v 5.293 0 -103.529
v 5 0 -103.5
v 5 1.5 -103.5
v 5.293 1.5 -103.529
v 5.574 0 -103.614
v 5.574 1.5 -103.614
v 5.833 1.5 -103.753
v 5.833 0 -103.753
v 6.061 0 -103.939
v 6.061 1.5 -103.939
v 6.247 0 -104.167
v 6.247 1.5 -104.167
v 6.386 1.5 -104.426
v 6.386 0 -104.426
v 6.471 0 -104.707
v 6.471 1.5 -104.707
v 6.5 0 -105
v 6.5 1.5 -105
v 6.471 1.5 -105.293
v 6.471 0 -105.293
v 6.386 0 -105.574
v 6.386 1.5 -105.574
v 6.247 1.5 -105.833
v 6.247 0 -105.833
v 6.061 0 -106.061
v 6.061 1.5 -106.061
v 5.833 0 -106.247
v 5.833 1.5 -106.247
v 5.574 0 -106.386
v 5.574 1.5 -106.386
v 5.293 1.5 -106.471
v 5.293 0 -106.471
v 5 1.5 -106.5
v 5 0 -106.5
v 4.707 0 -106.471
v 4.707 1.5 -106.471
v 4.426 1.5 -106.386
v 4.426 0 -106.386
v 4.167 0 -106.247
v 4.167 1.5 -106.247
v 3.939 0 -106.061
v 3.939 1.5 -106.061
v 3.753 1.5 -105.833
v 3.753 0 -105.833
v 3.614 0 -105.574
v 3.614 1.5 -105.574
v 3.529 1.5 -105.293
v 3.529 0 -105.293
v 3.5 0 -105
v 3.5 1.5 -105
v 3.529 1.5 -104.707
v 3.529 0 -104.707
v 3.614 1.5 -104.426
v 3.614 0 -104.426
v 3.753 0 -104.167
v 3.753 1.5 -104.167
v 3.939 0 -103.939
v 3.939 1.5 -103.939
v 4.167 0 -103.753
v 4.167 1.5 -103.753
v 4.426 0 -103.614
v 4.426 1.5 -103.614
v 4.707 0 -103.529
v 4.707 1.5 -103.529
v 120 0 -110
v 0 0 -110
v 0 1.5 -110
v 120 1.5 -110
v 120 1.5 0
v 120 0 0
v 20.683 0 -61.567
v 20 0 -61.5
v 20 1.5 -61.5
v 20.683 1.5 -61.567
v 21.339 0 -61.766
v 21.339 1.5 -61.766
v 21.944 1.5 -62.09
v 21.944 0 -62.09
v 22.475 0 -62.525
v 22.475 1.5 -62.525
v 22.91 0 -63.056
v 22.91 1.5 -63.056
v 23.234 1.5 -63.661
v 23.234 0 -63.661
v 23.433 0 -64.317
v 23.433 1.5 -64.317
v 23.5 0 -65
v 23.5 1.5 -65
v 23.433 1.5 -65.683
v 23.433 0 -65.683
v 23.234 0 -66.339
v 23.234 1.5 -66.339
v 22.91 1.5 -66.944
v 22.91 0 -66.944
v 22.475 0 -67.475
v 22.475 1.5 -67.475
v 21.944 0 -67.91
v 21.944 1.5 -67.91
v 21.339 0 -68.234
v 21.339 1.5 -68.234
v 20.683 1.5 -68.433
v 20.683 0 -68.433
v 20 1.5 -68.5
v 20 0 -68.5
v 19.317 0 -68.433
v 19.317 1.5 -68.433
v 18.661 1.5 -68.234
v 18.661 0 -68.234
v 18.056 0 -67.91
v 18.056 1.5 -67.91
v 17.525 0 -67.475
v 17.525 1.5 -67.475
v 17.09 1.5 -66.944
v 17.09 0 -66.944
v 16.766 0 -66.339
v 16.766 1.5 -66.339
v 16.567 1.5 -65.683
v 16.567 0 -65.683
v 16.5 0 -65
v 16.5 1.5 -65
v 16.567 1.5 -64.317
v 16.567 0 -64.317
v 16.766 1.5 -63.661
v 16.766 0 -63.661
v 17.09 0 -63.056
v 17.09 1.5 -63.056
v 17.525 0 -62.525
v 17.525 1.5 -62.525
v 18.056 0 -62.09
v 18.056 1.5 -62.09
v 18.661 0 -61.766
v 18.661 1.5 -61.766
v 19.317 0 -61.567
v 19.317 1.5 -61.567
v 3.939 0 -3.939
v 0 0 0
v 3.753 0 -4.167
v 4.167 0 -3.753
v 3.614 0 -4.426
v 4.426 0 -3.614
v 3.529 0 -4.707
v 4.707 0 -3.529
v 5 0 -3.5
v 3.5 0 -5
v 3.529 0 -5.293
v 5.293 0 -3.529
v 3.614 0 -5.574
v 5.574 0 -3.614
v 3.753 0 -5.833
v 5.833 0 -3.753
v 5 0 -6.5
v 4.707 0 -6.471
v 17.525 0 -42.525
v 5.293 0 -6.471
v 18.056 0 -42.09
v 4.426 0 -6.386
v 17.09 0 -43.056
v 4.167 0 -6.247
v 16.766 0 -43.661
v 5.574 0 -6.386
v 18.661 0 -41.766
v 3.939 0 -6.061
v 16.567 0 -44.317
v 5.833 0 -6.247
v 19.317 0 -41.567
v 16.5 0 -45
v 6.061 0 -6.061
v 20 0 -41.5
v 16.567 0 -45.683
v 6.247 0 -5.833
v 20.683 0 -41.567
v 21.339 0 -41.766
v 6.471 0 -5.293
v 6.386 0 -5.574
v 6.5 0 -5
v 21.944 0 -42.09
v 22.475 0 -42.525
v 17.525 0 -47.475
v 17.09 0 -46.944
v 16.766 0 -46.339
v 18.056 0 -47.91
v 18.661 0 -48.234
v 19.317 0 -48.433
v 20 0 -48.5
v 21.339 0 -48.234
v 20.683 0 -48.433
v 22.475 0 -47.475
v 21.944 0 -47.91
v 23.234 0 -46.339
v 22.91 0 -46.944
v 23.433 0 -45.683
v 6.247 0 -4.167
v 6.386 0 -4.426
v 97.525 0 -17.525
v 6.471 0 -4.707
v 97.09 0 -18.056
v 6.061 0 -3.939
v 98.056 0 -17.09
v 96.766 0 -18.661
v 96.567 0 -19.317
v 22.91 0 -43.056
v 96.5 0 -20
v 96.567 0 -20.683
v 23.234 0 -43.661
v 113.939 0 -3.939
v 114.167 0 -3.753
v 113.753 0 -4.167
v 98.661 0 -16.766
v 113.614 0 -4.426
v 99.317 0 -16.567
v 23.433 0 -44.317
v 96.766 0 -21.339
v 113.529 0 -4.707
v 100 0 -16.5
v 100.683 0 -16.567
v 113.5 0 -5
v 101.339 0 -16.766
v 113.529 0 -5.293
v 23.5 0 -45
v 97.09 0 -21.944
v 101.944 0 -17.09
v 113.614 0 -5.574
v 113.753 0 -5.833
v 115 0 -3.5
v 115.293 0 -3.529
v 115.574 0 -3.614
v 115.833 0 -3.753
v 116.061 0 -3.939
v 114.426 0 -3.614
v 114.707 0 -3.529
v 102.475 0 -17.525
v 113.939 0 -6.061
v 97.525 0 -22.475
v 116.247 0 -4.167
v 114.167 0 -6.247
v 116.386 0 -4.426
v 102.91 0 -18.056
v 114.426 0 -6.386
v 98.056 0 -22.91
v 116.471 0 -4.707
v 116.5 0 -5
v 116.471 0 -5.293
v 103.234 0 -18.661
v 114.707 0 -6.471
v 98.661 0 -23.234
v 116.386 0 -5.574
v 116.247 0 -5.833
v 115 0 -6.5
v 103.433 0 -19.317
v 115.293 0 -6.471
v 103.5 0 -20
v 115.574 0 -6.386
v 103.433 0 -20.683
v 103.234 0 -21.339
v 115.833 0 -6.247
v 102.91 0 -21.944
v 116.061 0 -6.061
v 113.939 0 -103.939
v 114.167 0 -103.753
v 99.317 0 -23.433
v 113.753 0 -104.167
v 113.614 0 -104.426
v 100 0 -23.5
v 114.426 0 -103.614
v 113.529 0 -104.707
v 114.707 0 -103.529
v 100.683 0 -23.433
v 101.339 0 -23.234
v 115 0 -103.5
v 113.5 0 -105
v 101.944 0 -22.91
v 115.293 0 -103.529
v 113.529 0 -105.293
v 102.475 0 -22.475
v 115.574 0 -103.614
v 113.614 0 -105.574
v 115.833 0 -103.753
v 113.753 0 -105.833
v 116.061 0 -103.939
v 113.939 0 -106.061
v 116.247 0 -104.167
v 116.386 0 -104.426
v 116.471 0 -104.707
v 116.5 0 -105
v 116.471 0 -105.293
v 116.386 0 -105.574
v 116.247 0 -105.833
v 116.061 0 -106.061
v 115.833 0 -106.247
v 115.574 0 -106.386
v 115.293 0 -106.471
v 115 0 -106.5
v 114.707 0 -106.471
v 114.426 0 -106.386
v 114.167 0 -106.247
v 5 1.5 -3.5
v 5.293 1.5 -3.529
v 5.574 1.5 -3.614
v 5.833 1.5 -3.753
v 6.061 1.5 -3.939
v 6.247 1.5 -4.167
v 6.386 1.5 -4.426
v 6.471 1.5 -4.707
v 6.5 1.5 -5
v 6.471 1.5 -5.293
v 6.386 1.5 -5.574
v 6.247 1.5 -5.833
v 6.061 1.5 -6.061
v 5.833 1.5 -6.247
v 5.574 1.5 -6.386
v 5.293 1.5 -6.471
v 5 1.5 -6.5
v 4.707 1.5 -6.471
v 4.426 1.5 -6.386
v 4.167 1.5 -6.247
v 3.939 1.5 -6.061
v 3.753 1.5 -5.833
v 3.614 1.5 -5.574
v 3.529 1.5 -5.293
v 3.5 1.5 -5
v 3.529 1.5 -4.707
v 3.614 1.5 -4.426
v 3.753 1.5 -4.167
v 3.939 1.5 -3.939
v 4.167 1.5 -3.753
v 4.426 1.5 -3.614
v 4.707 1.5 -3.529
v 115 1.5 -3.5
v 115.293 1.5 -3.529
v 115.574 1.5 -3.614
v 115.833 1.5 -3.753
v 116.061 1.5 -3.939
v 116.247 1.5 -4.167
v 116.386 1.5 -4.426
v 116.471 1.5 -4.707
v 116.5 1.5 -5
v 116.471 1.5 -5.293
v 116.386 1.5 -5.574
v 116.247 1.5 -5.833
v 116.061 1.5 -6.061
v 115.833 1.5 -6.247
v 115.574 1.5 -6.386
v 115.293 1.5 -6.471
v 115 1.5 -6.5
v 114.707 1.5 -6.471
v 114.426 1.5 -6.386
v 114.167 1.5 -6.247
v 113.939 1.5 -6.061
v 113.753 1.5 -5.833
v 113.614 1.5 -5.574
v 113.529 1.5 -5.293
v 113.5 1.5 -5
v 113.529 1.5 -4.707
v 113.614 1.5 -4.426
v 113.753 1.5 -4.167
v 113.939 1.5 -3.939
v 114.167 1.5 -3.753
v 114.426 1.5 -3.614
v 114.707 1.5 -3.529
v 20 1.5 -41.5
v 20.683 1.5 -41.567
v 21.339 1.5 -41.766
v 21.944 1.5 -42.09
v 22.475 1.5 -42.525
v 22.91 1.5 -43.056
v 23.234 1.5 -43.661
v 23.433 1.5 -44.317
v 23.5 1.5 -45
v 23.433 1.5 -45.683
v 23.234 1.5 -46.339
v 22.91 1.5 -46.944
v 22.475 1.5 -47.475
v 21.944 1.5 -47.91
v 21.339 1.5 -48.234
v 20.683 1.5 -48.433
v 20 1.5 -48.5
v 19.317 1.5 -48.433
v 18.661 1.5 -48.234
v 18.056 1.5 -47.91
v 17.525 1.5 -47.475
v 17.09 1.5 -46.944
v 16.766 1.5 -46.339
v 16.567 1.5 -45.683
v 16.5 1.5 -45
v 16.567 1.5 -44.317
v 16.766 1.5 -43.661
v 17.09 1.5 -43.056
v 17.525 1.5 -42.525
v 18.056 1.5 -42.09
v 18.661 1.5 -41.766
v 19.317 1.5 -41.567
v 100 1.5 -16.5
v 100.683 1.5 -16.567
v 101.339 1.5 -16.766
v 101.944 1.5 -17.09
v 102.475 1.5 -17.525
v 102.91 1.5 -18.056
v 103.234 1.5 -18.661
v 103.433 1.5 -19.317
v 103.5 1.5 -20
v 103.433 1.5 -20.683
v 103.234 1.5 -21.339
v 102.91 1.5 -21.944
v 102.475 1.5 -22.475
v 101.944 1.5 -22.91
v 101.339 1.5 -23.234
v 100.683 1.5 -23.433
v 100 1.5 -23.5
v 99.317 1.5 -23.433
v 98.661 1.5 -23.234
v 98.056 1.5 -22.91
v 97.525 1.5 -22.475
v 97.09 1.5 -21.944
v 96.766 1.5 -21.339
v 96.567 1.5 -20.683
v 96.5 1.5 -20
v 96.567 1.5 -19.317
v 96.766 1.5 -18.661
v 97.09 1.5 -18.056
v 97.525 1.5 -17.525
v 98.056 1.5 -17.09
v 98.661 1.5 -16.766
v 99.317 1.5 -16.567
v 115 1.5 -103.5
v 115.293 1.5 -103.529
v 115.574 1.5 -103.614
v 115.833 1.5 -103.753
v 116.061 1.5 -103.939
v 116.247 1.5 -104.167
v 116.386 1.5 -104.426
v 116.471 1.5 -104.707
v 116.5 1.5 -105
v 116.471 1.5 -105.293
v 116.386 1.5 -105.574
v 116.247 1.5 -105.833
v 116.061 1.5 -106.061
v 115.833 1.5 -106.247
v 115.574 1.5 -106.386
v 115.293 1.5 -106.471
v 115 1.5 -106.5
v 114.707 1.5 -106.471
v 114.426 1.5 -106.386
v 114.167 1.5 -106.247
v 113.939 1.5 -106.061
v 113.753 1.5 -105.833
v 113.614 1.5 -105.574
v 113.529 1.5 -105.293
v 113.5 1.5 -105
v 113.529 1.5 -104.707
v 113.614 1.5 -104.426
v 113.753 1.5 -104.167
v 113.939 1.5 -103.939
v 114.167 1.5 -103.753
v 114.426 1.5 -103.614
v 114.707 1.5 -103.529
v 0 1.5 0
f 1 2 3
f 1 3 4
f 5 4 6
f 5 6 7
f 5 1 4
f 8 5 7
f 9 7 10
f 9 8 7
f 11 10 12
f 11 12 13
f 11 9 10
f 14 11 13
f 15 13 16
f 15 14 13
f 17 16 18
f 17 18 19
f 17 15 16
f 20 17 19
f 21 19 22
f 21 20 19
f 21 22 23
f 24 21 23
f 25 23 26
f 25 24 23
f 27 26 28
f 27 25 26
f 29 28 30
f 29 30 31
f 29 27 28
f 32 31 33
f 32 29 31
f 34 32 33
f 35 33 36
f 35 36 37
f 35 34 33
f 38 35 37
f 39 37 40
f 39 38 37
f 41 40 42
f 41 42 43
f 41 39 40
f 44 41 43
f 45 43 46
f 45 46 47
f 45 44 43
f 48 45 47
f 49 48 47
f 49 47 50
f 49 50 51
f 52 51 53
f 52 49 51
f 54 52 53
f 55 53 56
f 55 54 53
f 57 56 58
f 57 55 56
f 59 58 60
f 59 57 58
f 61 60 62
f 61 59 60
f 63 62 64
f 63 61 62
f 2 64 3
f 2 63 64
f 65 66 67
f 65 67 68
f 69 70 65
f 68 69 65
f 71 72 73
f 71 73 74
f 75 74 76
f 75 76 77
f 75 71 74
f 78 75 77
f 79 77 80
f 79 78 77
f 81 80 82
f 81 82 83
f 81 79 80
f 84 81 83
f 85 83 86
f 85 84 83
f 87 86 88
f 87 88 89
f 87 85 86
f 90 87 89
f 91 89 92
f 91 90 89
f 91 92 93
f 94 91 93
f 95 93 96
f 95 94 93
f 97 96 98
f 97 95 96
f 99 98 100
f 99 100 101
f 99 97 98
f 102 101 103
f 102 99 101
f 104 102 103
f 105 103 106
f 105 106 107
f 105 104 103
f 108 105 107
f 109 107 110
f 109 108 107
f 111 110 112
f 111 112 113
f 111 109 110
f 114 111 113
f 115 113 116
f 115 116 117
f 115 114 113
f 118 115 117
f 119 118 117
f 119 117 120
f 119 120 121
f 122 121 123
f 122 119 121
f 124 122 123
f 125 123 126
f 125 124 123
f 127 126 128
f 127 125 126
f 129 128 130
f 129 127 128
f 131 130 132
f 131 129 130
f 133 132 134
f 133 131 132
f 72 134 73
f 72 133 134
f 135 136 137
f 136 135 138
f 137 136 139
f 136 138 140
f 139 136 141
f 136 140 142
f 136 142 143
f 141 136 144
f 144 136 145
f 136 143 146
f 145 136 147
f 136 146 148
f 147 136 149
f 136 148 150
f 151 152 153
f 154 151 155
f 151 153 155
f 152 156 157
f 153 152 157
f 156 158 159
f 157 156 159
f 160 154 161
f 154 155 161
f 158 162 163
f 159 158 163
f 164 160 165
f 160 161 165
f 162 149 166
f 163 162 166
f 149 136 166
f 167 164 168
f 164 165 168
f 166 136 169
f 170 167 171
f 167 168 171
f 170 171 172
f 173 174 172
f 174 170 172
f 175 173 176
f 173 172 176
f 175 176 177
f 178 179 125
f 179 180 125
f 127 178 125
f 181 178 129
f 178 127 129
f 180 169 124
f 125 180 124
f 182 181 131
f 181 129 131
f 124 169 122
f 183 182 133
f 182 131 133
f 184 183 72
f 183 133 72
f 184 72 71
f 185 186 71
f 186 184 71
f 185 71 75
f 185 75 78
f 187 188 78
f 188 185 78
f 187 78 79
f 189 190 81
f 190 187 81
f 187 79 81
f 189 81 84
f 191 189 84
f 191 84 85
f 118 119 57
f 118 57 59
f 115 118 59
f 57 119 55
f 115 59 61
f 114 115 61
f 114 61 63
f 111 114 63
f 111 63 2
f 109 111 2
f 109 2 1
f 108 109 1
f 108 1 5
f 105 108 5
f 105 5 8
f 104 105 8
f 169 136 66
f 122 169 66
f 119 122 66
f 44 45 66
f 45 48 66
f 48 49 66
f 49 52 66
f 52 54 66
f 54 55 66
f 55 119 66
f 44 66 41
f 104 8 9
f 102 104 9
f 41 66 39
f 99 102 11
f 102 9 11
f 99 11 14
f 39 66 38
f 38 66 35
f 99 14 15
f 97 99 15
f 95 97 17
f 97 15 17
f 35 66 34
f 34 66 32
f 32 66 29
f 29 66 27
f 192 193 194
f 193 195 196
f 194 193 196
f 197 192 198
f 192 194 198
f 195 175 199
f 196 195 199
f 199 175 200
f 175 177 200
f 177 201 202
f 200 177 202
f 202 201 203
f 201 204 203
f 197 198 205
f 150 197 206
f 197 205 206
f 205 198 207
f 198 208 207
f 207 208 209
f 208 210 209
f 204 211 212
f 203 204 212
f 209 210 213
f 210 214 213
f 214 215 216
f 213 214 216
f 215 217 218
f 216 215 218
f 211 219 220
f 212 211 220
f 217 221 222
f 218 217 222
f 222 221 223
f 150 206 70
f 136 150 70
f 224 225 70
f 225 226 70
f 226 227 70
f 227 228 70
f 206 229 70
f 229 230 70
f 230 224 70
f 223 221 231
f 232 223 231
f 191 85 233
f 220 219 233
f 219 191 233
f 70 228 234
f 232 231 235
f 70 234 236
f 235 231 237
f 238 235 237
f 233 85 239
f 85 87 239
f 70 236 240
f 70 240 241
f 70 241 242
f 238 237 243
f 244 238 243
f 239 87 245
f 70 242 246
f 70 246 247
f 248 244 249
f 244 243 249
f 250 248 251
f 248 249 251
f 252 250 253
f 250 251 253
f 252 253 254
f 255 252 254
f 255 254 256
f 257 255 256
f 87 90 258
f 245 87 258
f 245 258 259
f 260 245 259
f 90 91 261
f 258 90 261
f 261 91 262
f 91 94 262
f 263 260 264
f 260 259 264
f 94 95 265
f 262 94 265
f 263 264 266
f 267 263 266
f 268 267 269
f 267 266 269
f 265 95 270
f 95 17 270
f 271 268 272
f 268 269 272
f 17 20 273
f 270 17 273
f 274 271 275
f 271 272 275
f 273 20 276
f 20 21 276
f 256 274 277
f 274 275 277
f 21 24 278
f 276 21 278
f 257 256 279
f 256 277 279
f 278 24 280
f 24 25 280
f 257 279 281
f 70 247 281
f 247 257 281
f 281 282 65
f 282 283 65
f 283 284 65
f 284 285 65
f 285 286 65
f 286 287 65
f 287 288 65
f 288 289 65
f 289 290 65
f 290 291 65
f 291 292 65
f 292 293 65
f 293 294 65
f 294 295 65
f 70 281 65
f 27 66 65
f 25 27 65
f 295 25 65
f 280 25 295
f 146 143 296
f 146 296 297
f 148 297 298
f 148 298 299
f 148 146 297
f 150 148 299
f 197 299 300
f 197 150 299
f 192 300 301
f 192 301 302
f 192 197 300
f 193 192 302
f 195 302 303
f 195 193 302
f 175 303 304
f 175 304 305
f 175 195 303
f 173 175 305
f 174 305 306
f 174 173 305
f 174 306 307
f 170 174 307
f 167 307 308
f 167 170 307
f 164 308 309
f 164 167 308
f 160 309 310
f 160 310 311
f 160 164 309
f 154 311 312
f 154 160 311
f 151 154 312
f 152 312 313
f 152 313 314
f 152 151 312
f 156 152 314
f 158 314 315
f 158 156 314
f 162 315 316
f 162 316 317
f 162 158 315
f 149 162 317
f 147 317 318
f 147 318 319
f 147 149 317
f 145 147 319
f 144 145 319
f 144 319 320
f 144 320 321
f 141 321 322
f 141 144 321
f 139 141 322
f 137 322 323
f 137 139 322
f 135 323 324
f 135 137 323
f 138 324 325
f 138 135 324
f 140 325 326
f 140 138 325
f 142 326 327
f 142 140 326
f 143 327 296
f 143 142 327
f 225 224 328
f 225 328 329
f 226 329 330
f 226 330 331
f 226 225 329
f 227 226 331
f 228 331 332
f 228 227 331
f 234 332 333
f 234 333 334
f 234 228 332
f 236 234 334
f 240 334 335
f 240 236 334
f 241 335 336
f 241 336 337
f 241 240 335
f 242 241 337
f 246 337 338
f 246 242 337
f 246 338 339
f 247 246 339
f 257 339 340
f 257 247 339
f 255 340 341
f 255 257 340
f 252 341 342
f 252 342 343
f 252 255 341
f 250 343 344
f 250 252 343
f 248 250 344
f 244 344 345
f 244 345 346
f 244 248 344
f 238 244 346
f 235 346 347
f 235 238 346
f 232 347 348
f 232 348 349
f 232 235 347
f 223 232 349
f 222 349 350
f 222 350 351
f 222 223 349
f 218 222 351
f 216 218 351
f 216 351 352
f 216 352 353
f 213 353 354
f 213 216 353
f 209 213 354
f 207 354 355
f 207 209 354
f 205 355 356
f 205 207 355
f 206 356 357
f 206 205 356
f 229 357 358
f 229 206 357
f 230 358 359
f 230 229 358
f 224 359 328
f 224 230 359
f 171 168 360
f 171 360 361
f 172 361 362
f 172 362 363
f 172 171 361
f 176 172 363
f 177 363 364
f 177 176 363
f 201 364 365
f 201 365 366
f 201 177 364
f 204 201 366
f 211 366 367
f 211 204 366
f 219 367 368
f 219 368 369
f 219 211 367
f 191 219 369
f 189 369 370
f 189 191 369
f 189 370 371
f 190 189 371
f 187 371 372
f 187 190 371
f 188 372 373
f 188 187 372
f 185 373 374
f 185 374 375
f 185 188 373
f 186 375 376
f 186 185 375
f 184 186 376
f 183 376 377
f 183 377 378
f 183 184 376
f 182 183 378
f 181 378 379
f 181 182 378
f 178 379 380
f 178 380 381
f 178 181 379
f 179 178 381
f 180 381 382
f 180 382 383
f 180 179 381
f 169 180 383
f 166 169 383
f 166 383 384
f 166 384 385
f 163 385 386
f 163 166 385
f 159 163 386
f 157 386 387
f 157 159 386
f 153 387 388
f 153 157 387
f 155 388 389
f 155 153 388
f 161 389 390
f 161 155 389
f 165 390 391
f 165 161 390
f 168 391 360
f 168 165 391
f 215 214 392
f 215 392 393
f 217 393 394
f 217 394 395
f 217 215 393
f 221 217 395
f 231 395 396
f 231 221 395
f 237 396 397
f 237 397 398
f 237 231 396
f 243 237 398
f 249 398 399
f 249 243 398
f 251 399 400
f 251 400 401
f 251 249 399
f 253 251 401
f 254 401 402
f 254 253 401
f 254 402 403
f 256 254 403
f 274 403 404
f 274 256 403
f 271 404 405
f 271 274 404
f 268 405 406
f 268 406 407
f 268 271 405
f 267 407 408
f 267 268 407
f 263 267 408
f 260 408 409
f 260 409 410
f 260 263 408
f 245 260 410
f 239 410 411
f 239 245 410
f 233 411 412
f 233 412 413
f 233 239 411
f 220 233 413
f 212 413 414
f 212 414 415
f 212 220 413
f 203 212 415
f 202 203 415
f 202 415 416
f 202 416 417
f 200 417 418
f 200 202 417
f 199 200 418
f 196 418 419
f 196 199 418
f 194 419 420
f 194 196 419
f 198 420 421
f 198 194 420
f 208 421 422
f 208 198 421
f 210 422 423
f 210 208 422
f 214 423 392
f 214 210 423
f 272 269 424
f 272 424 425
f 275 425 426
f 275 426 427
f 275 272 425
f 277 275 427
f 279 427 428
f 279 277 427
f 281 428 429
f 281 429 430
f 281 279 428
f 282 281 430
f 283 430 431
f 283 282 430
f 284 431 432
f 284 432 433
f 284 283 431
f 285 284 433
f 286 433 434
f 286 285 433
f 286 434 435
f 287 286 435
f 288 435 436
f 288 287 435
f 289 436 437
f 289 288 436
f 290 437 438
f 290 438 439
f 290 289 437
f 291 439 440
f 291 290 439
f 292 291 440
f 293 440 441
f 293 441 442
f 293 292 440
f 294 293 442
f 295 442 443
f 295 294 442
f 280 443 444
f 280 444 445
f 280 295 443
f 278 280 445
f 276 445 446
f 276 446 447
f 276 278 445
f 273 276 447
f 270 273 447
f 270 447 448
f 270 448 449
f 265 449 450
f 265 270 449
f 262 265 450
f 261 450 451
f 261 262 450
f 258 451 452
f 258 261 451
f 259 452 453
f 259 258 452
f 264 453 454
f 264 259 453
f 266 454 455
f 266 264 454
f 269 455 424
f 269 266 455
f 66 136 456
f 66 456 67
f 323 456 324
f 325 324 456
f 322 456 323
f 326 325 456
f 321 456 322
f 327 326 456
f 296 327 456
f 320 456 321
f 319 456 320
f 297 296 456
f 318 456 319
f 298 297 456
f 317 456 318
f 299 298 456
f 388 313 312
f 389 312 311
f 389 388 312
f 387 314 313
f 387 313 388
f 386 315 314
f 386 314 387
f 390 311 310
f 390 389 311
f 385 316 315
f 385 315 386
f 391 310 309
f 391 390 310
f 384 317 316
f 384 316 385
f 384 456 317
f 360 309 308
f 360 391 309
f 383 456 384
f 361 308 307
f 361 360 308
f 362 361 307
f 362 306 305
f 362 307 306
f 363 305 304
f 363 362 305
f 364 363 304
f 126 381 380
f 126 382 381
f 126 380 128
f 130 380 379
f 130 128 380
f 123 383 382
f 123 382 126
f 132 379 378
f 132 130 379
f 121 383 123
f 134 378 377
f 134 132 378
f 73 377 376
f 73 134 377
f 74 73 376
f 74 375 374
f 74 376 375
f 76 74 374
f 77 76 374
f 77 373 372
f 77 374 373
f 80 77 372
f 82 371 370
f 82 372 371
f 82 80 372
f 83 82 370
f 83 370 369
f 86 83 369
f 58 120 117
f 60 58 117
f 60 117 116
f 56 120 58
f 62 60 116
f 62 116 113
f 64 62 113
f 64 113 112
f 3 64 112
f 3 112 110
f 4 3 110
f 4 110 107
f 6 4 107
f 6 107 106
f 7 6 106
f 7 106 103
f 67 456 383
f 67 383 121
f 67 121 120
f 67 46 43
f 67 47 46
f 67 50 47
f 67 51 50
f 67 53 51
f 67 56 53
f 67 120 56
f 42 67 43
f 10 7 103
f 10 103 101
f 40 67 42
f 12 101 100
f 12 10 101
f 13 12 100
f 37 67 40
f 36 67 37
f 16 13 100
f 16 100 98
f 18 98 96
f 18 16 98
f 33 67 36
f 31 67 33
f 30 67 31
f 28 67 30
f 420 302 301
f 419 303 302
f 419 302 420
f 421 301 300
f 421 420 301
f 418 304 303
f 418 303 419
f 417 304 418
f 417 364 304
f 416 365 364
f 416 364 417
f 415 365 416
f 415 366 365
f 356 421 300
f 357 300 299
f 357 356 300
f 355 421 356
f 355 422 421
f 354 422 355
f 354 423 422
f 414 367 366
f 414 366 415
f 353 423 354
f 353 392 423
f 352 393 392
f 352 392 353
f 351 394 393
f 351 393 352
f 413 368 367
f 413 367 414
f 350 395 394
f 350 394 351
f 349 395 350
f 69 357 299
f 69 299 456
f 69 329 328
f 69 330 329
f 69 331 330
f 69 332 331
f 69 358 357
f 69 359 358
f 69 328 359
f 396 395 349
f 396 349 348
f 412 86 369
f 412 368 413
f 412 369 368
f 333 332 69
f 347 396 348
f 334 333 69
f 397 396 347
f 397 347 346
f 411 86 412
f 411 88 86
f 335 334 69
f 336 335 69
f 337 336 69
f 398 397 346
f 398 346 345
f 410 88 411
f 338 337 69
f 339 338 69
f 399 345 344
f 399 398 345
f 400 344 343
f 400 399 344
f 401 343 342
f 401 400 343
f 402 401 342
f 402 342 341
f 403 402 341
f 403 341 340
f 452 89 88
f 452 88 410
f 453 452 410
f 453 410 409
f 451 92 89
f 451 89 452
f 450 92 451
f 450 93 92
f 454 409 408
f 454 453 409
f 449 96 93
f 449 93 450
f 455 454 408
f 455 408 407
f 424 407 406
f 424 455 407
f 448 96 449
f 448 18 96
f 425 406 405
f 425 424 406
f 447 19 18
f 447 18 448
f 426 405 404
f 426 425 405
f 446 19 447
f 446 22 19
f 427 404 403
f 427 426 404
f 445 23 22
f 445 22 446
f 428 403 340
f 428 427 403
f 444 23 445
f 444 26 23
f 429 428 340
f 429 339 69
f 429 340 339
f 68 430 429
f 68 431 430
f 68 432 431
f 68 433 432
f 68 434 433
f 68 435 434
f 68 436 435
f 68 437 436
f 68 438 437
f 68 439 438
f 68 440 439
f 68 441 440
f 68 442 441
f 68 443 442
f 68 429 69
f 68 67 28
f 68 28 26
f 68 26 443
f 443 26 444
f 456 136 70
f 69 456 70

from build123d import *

# Parameters (mm, degrees)
SKETCH1_W           = 120
SKETCH1_H           = 110
SKETCH1_R           = 1.5
SKETCH1_R_2         = 3.5
BOSS_EXTRUDE1_DEPTH = 1.5


with BuildPart() as part:
    # Sketch1 → Boss-Extrude1 (new body)
    with BuildSketch(Plane(origin=(0, 0, 0), x_dir=(1, 0, 0), z_dir=(0, 1, 0))):
        with Locations((60, 55)):
            Rectangle(SKETCH1_W, SKETCH1_H)
        with Locations(Location((5, 105, 0), (0, 0, 270))):
            Circle(SKETCH1_R, mode=Mode.SUBTRACT)
        with Locations(Location((115, 105, 0), (0, 0, 270))):
            Circle(SKETCH1_R, mode=Mode.SUBTRACT)
        with Locations(Location((115, 5, 0), (0, 0, 270))):
            Circle(SKETCH1_R, mode=Mode.SUBTRACT)
        with Locations(Location((5, 5, 0), (0, 0, 270))):
            Circle(SKETCH1_R, mode=Mode.SUBTRACT)
        with Locations(Location((100, 20, 0), (0, 0, 270))):
            Circle(SKETCH1_R_2, mode=Mode.SUBTRACT)
        with Locations(Location((20, 65, 0), (0, 0, 270))):
            Circle(SKETCH1_R_2, mode=Mode.SUBTRACT)
        with Locations(Location((20, 45, 0), (0, 0, 270))):
            Circle(SKETCH1_R_2, mode=Mode.SUBTRACT)
    extrude(amount=BOSS_EXTRUDE1_DEPTH)


solid = part.part
